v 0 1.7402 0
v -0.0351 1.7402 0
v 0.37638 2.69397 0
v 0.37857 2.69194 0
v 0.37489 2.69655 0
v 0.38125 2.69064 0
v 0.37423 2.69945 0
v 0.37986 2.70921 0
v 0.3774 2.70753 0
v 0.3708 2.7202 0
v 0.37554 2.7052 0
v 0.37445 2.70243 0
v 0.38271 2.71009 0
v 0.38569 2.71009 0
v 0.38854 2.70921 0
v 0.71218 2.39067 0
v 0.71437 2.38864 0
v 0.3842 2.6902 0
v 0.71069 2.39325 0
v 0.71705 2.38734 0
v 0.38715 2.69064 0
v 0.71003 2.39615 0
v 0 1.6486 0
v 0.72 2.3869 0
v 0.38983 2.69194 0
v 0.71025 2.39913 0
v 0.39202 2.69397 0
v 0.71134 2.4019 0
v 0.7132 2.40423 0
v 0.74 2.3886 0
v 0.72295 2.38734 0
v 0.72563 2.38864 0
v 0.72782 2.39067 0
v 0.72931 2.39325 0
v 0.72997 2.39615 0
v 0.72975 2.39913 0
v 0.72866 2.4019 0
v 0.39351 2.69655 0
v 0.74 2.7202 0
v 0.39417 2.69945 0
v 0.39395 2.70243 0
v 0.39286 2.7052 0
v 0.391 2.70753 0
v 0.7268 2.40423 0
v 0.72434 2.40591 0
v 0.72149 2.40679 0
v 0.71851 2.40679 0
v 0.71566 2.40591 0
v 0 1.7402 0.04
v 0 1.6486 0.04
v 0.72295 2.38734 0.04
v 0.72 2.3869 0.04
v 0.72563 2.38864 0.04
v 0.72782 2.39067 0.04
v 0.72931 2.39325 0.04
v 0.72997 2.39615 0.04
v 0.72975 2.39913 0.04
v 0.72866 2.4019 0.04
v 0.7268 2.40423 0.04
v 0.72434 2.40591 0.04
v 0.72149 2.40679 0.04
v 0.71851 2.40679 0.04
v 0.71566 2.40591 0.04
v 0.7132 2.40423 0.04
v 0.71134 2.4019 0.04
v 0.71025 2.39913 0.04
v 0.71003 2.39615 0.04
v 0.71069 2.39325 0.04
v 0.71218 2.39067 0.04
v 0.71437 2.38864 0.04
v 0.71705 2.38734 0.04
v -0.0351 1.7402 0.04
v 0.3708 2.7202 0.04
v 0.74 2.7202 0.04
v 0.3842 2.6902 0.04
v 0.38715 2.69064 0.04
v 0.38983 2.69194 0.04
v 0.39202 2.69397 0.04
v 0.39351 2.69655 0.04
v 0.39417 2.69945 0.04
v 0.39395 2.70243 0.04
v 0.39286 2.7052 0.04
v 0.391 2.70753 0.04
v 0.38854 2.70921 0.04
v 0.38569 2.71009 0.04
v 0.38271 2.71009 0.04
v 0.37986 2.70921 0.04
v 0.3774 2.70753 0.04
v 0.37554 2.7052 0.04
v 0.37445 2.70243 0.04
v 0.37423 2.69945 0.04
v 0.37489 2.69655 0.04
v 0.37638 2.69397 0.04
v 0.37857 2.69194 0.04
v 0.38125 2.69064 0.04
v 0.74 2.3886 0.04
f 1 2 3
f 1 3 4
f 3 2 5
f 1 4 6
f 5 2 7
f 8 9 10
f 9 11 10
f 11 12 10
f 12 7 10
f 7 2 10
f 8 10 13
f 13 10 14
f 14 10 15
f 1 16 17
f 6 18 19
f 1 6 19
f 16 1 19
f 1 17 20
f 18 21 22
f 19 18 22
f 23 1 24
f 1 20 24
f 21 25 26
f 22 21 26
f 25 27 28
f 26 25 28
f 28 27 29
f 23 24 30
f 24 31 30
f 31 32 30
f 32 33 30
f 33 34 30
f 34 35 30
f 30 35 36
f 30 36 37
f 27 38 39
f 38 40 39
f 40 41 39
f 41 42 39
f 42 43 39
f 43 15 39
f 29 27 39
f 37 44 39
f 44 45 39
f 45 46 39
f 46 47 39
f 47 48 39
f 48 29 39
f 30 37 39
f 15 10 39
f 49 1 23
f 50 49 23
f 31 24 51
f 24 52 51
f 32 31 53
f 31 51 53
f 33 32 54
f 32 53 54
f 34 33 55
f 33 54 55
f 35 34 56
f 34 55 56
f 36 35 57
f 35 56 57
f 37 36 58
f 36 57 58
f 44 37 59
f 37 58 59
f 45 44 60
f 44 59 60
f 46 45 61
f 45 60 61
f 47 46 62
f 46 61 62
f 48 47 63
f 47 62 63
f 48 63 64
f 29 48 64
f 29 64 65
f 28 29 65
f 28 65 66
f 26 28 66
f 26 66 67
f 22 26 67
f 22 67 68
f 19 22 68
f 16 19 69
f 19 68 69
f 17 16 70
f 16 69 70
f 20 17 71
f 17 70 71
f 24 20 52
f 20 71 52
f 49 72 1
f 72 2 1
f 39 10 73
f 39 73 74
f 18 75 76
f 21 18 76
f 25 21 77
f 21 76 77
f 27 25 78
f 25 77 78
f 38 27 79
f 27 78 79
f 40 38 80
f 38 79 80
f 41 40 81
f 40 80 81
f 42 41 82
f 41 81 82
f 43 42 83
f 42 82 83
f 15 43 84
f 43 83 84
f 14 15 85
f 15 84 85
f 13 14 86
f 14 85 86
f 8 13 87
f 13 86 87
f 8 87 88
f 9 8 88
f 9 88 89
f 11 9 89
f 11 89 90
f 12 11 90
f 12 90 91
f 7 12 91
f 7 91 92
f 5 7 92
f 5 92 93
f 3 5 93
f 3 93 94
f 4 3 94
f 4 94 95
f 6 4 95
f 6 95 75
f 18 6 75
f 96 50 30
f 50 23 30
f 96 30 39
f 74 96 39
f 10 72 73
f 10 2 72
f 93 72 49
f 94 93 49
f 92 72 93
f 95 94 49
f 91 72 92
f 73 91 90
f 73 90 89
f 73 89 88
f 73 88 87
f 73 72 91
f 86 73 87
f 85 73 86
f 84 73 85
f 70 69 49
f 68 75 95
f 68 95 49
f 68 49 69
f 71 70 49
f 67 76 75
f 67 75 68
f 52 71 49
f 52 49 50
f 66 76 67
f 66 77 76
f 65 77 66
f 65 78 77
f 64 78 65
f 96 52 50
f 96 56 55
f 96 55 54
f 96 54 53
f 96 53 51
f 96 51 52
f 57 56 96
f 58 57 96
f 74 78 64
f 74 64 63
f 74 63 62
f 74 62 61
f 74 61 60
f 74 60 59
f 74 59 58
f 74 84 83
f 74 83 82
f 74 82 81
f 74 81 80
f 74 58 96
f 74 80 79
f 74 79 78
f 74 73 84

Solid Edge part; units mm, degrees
sketch "Sketch1" plane through (0, 0, 0) normal (0, 0, 1) x (1, 0, 0)
  line L0 (0, 1.6486) -> (0.74, 2.3886)
  line L1 (0.74, 2.3886) -> (0.74, 2.7202)
  line L2 (0.3708, 2.7202) -> (0.74, 2.7202)
  line L3 (-0.0351, 1.7402) -> (0.3708, 2.7202)
  line L4 (-0.0351, 1.7402) -> (0, 1.7402)
  line L5 (0, 1.7402) -> (0, 1.6486)
extrude "Protrusion1" add sketch "Sketch1" along normal blind 0.04
hole "Bohrung_5" at (0.3842, 2.7002, 0.04) direction (0, 0, -1) diameter 0.02 end through all
hole "Hole1" at (0.72, 2.3969, 0.04) direction (0, 0, -1) diameter 0.02 end through all
